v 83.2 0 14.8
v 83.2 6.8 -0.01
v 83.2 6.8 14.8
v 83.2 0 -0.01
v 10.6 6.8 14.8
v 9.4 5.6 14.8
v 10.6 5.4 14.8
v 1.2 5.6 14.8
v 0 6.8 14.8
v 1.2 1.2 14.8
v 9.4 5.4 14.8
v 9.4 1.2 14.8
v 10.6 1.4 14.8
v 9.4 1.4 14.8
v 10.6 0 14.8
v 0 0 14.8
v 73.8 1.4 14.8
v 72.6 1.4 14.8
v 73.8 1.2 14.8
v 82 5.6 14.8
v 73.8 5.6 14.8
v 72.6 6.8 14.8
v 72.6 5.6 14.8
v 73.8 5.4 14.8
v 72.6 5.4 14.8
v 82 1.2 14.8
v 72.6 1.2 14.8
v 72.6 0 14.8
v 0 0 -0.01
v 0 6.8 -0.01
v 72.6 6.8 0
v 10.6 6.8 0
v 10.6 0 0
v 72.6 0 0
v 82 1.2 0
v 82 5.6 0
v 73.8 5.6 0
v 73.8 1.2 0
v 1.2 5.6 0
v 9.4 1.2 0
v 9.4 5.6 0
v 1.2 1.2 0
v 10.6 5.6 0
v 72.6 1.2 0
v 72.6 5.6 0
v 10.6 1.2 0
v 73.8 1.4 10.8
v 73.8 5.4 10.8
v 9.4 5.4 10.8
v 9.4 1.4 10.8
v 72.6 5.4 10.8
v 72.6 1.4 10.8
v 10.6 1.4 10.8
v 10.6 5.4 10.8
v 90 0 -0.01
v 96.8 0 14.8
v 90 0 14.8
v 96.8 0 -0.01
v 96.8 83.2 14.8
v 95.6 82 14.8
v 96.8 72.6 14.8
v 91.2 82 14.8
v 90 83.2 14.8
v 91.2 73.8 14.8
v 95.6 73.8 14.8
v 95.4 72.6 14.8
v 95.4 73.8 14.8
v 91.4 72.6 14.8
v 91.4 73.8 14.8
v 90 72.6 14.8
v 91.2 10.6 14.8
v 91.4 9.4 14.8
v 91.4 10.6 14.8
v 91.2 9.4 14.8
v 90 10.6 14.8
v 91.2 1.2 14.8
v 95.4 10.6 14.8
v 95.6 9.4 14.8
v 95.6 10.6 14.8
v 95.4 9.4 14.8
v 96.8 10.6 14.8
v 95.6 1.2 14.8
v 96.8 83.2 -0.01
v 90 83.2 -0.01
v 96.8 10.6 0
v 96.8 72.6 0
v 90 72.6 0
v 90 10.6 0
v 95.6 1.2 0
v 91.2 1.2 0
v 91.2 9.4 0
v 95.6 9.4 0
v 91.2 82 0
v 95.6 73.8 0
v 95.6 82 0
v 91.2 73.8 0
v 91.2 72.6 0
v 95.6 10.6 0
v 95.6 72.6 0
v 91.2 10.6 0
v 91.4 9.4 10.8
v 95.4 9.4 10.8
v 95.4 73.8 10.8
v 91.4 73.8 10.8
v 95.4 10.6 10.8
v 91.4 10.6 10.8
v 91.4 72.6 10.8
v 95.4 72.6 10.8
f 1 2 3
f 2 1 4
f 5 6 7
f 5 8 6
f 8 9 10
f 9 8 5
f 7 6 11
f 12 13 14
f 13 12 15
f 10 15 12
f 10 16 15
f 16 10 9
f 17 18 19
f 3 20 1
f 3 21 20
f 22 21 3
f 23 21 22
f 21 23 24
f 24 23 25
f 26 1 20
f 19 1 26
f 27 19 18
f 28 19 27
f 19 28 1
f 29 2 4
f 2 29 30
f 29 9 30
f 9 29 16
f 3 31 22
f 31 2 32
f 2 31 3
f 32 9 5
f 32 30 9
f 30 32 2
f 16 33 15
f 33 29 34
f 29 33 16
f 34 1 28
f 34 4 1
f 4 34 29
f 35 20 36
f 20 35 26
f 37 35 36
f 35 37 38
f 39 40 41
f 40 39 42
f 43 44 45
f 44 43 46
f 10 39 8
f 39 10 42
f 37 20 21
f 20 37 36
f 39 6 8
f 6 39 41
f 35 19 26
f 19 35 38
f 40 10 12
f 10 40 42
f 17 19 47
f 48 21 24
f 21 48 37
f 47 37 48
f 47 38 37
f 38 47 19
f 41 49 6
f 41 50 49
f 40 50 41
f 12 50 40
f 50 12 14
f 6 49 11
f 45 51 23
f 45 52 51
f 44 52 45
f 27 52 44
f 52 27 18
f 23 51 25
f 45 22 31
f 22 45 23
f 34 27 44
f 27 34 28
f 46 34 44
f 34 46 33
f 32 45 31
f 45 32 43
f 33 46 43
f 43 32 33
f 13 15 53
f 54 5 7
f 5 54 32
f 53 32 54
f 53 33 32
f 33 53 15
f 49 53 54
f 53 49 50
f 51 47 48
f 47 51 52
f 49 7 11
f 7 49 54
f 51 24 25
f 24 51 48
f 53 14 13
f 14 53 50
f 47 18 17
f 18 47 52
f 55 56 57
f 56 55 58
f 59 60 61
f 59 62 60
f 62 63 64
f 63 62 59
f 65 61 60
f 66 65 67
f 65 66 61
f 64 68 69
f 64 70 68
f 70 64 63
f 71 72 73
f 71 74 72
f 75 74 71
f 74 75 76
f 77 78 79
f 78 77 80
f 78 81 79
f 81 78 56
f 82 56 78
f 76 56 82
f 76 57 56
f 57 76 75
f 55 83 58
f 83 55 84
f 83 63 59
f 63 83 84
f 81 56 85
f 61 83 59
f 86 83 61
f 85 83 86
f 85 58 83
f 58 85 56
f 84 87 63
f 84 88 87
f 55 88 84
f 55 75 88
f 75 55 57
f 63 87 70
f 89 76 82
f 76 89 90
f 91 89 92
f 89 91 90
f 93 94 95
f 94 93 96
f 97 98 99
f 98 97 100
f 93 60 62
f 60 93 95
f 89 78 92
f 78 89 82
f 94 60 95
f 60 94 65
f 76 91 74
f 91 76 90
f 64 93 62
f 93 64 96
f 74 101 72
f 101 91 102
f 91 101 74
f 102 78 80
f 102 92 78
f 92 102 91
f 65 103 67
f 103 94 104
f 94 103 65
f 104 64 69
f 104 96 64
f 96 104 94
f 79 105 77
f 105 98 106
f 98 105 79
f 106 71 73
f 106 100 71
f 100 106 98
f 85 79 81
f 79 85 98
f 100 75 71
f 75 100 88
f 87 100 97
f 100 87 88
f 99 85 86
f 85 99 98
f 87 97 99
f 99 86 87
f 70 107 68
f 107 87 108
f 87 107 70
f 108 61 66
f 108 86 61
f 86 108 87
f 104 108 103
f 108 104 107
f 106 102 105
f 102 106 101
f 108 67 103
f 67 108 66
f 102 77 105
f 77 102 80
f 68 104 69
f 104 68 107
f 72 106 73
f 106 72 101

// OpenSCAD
// file: ../../Base/Boxes.scad
// Fischertechnik Box Foundation
// Pre-designed Boxes

use <Constants.scad>

include <PlacementOptions.scad>

box190Width = 190;
box190Depth = 130;
box130Width = 130;
box130Depth = 95;
boxUsageHeight = 33.9;
boxWallThickness = 2.4;
boxBaseThickness = 1.0;

// getBoxWallThickness()
// Gets the wall thickness of a Fischertechnik Box

function getBoxWallThickness() = boxWallThickness;

// Gets the usable height of a fischertechnik box
function getBoxUsageHeight() = boxUsageHeight;

// Gets the thickness of the Fischertechnik box base.
function getBoxBaseThickness() = boxBaseThickness;

// Gets the usable inner space of a Box 190 as an x/y-list
function getBox190Space() = [
    box190Width - 2*getBoxWallThickness(), 
    box190Depth - 2*getBoxWallThickness() ];

// Imports the Fischertechnik empty box 130x190 mm and places it at position 0,0
// 190x130 are the outer sizes, the inner space is slightly smaller. Use getBox190Space() to get the inner sizes.
// This module needs the STL file "Fischertechnik Box 130x190.stl" in the library path.
// The box is positioned that the usable inner space is at the 0,0,0 position. The

module Box190() {
    translate([-getBoxWallThickness(),-getBoxWallThickness(),-getBoxBaseThickness()])
        import("Fischertechnik Box 130x190.stl", convexity=3);
}

// Gets the usable inner space of a Box 130 as an x/y-list
function getBox130Space() = [
    box130Width - 2*getBoxWallThickness(), 
    box130Depth - 2*getBoxWallThickness() ];

// Imports the Fischertechnik empty box 95x130 mm and places it at position 0,0
// 190x130 are the outer sizes, the inner space is slightly smaller. Use getBox190Space() to get the inner sizes.
// This module needs the STL file "Fischertechnik Box 95x130.stl" in the library path.
// The box is positioned that the usable inner space is at the 0,0,0 position. The

module Box130() {
    translate([-getBoxWallThickness(),-getBoxWallThickness(),-getBoxBaseThickness()])
        import("Fischertechnik Box 95x130.stl", convexity=3);
}

// Creates a web at the specified box walls
// corner 0 = LowerLeft, 1 = UpperLeft, 2 = UpperRight, 3 = LowerRight
// side 0 = LeftOfCorner, 1 = RightOfCorner
// distance = Distance in mm from the corner
// box = inner width and depth of the box (default: Box 190)
// webWidth = length of the web (default is 3 mms)
// webThickness = thickness of the web (default is 1 mm)

module BoxWeb(corner, side, distance, box=getBox190Space(), webWidth=3, webThickness=1.0) {
    sink = getBoxWallThickness()/2;

    width = (corner % 2 == 0) ? 
            (side == LeftOfCorner ? webWidth : webThickness) :
            (side == LeftOfCorner ? webThickness : webWidth);

    depth = (corner % 2 == 0) ? 
            (side == RightOfCorner ? webWidth : webThickness) :
            (side == RightOfCorner ? webThickness : webWidth);
    
    xDiff = corner == LowerLeft ? 
                (side == LeftOfCorner ? -sink : distance) :
            (corner == UpperLeft ?                
                (side == LeftOfCorner ? distance : -sink) :
            (corner == UpperRight ?
                (side == LeftOfCorner ? box.x-webWidth+sink : box.x-distance-webThickness) :
                (side == LeftOfCorner ? box.x-distance-webThickness: box.x-webWidth+sink)));

    yDiff = corner == LowerLeft ? 
                (side == RightOfCorner ? -sink : distance) :
            (corner == UpperLeft ?
                (side == RightOfCorner ? box.y-distance : box.y-webWidth+sink) :
            (corner == UpperRight ?
                (side == RightOfCorner ? box.y-webWidth+sink : box.y-distance) :
                (side == RightOfCorner ? distance : -sink)));
    
    translate([xDiff, yDiff, -getExcess()])
        cube([width, depth, boxUsageHeight + 2*getExcess()]);
}
// file: ../../Base/Rotation.scad
// Fischertechnik Box Foundation
// Geometry Helpers Rotation

include <PlacementOptions.scad>

// getRotatedSpace(space, rotation=NoRotation)
// Rotates the space dependent on the specified rotation

function getRotatedSpace(space, rotation=NoRotation) = [
    (rotation == Rotate90 || rotation == Rotate270) ? space.y : space.x,
    (rotation == Rotate90 || rotation == Rotate270) ? space.x : space.y
];

// Rotates the given space around the fixed left lower corner
// space = the space the children needs as width/depth list [width,depth]
// rotation = 0 Rotate0 degrees, 1 Rotate90 degrees, 2 Rotate180 degrees, 3 Rotate270 degrees (equivalent to -90)

module RotateFix(space, rotation=Rotate0) {
    dy = (rotation == Rotate0 || rotation == Rotate270) ? 0 :
        (rotation == Rotate90) ? space.x :
        space.y;
    dx = (rotation < Rotate180) ? 0 :
        (rotation == Rotate180) ? space.x :
        space.y;
    
    translate([dx, dy, 0])
        rotate([0, 0, rotations[rotation]])
            children();
}
// file: ../../Base/Alignment.scad
// Fischertechnik Box Foundation
// Geometry Helpers Alignment

include <PlacementOptions.scad>

// getAlignedX(elementWidth, spaceWidth, align=AlignRight, offset=0)
// Gets the aligned X offset of an element with the given
// width in the given space.
// elementWidth = The width of the element to positon
// spaceWidth = The space where the element should be aligned
// align = 0 AlignLeft, 1 AlignCenter, 2 AlignRight
// offset = an optional offset from the aligned position. When
// aligned left or centered, then positive values are in X direction.
// When aligned right then positive values are in negative X direction.

function getAlignedX(elementWidth, spaceWidth, align=AlignRight, offset=0) =
    (align == AlignLeft) ?
        offset :
        ((align == AlignCenter) ?
        (spaceWidth - elementWidth)/2 + offset :
        spaceWidth - offset - elementWidth);

// getAlignedY(elementDepth, spaceDepth, align=AlignTop, offset=0)
// Gets the aligned Y offset of an element with the given
// depth in the given space.
// elementDepth = The depth of the element to positon
// spaceDepth = The space where the element should be aligned
// align = 0 AlignBottom, 1 AlignCenter, 2 AlignTop
// offset = an optional offset from the aligned position. When
// aligned bottom or centered, then positive values are in Y direction.
// When aligned top then positive values are in negative Y direction.

function getAlignedY(elementDepth, spaceDepth, align=AlignTop, offset=0) =
    (align == AlignBottom) ?
        offset :
        ((align == AlignCenter) ?
        (spaceDepth - elementDepth)/2 + offset :
        spaceDepth - offset - elementDepth);
// file: ../../Base/Constants.scad
// Fischertechnik Box Foundation
// Constants

// Constant values necessary for multiple elements

// Base constants
dividerThickness = 1.2;
excess = 0.01;
fragments = 90;
tolerance = 0.8;

// Gets the thickness of a divider 
function getDividerThickness() = dividerThickness;

// Gets the excess that is used to merge walls into each other
function getExcess() = excess;

// Gets amount of fragments of a cylinder
function getFragments() = fragments;

// Gets the inner tolerance of a frame to each side
function getTolerance() = tolerance;


// Fischertechnik specific constants
axisDiameter = 4;
axisBottomDiameter = axisDiameter + 1;
standardEdgeDistance = 2.5;
standardWebDistance = 11.5;
standardCornerLength = 15;
tubeWallFactor = 1.6;

// Gets axis diameter
function getAxisDiameter() = axisDiameter;

// Gets axis bottom diameter for thicker part at the bottom
function getAxisBottomDiameter() = axisBottomDiameter;

// gets the standard distance to the wall of the box for dockable frames with webs
function getStandardEdgeDistance() = standardEdgeDistance;

// gets the standard distance of each web to the corner of the dockable frame
function getStandardWebDistance() = standardWebDistance;

// gets the standard length of the corner walls of a dockable frame
function getStandardCornerLength() = standardCornerLength;

// gets the wall thickness of a tube.
function getTubeWallThickness() = tubeWallFactor * getDividerThickness();
// file: ../../Base/PlacementOptions.scad
// Fischertechnik Box Foundation
// Placement Options

// Alignment
NoAlign = 0;
AlignLeft = 1;
AlignBottom = 2;
AlignCenter = 3;
AlignRight = 4;
AlignTop = 5;

// Element rotation degree steps
rotations = [0, -90, -180, -270];

// Rotation
NoRotation = 0;
Rotate0 = 0;
Rotate90 = 1;
Rotate180 = 2;
Rotate270 = 3;

// Docking (seen from above)
NoDock = -1;
DockLeft = 0;
DockTop = 1;
DockRight = 2;
DockCorner = 2;
DockBottom = 3;

// Web corners
LowerLeft = 0;
UpperLeft = 1;
UpperRight = 2;
LowerRight = 3;

// Web position relative to corner
LeftOfCorner = 0;
RightOfCorner = 1;
// file: ../../Elements/FrameAxis80.scad
// Fischertechnik Box Library
// Frame for single 80 mm Axis
// 37384

use <../Base/Constants.scad>
use <../ModelBase/Complex.scad>

length = 80;

// getFrameAxis80Space()
// Gets the width (.x) and depth (.y) of the axis frame.

function getFrameAxis80Space() = getFrameAxisSpace(length);

// FrameAxis80()
// Axis holder for a single 80 mm axis.

module FrameAxis80() {
    FrameAxis(length);
}

// Test
color("lightgray")
FrameAxis80();
// file: ../../Base/Placement.scad
// Fischertechnik Box Foundation
// Geometry Helpers Placement

use <Constants.scad>
use <Alignment.scad>
use <Rotation.scad>
use <Boxes.scad>

include <PlacementOptions.scad>

// Place(x=0, y=0, elementSpace=[0,0], alignX=AlignLeft, alignY=AlignBottom, rotation=Rotate0, boxSpace=getBox190Space())
// Places the child at the specified position
// y = Y-Position. This is a relative position when an X aligment is specified.
// x = X-Position. This is a relative position when an Y aligment is specified.
// elementSpace = space of the element to be placed [x,y]
// alignX = -1=NoAlign, 0 AlignLeft, 1 AlignCenter, 3 AlignRight (elementSpace and boxSpace required!)
// alignY = -1=NoAlign, 2 AlignBottom, 1 AlignCenter, 4 AlignTop (elementSpace and boxSpace required!)
// rotation = 0 Rotate0 0 degrees, 1 Rotate90 90 degrees, 
// 2 Rotate180 180 degrees, 3 Rotate270 270 degrees (equivalent to -90)
// boxSpace = Inner space of the box where the placement occurs [x,y] - default is Box 190x130 inner space

module Place(x=0, y=0, elementSpace=[0,0], 
  alignX=AlignLeft, alignY=AlignBottom, 
  rotation=NoRotation, boxSpace=getBox190Space()) {

    module Position(x, y, space, rotation=Rotate0) {
        translate([x, y, 0])
            RotateFix(space, rotation)
                children(0);
    }

    space = getRotatedSpace(elementSpace, rotation);
    alignedX = getAlignedX(space.x, boxSpace.x, alignX, x);
    alignedY = getAlignedY(space.y, boxSpace.y, alignY, y);
    Position(alignedX, alignedY, elementSpace, rotation)
        children(0);
}

// Center(space=getBox130Space(), elementSpace=[0,0])
// space = Space where the children is centered. For cylinder use centered=true and no elementSpace.
// elementSpace = space of the element to be centered [x,y]

module Center(space=getBox190Space(), elementSpace=[0,0]) {
    translate([(space.x - elementSpace.x) / 2, (space.y - elementSpace.y) / 2])
        children(0);
}

// CenterHorizontal(width=0, y=0, offset=0, space=getBox130Space())
// space = Space where the children is centered. For cylinder use centered=true and no elementSpace.
// elementSpace = space of the element to be centered [x,y]

module CenterHorizontal(width=0, y=0, offset=0, space=getBox190Space()) {
    translate([(space.x - width) / 2 + offset, y])
        children(0);
}

// CenterVertical(depth=0, x=0, offset=0, space=getBox130Space())
// space = Space where the children is centered. For cylinder use centered=true and no elementSpace.
// elementSpace = space of the element to be centered [x,y]

module CenterVerticalal(depth=0, x=0, offset=0, space=getBox190Space()) {
    translate([x, (space.y - depth) / 2 + offset])
        children(0);
}
// main file
// Fischertechnik Box Foundation
// Elements
// Test FrameAxis80

use <../../Base/Placement.scad>
use <../../Elements/FrameAxis80.scad>

include <../../Base/PlacementOptions.scad>

FrameAxis80();

Place(90, 0, elementSpace=getFrameAxis80Space(), rotation=Rotate90)
    FrameAxis80();
